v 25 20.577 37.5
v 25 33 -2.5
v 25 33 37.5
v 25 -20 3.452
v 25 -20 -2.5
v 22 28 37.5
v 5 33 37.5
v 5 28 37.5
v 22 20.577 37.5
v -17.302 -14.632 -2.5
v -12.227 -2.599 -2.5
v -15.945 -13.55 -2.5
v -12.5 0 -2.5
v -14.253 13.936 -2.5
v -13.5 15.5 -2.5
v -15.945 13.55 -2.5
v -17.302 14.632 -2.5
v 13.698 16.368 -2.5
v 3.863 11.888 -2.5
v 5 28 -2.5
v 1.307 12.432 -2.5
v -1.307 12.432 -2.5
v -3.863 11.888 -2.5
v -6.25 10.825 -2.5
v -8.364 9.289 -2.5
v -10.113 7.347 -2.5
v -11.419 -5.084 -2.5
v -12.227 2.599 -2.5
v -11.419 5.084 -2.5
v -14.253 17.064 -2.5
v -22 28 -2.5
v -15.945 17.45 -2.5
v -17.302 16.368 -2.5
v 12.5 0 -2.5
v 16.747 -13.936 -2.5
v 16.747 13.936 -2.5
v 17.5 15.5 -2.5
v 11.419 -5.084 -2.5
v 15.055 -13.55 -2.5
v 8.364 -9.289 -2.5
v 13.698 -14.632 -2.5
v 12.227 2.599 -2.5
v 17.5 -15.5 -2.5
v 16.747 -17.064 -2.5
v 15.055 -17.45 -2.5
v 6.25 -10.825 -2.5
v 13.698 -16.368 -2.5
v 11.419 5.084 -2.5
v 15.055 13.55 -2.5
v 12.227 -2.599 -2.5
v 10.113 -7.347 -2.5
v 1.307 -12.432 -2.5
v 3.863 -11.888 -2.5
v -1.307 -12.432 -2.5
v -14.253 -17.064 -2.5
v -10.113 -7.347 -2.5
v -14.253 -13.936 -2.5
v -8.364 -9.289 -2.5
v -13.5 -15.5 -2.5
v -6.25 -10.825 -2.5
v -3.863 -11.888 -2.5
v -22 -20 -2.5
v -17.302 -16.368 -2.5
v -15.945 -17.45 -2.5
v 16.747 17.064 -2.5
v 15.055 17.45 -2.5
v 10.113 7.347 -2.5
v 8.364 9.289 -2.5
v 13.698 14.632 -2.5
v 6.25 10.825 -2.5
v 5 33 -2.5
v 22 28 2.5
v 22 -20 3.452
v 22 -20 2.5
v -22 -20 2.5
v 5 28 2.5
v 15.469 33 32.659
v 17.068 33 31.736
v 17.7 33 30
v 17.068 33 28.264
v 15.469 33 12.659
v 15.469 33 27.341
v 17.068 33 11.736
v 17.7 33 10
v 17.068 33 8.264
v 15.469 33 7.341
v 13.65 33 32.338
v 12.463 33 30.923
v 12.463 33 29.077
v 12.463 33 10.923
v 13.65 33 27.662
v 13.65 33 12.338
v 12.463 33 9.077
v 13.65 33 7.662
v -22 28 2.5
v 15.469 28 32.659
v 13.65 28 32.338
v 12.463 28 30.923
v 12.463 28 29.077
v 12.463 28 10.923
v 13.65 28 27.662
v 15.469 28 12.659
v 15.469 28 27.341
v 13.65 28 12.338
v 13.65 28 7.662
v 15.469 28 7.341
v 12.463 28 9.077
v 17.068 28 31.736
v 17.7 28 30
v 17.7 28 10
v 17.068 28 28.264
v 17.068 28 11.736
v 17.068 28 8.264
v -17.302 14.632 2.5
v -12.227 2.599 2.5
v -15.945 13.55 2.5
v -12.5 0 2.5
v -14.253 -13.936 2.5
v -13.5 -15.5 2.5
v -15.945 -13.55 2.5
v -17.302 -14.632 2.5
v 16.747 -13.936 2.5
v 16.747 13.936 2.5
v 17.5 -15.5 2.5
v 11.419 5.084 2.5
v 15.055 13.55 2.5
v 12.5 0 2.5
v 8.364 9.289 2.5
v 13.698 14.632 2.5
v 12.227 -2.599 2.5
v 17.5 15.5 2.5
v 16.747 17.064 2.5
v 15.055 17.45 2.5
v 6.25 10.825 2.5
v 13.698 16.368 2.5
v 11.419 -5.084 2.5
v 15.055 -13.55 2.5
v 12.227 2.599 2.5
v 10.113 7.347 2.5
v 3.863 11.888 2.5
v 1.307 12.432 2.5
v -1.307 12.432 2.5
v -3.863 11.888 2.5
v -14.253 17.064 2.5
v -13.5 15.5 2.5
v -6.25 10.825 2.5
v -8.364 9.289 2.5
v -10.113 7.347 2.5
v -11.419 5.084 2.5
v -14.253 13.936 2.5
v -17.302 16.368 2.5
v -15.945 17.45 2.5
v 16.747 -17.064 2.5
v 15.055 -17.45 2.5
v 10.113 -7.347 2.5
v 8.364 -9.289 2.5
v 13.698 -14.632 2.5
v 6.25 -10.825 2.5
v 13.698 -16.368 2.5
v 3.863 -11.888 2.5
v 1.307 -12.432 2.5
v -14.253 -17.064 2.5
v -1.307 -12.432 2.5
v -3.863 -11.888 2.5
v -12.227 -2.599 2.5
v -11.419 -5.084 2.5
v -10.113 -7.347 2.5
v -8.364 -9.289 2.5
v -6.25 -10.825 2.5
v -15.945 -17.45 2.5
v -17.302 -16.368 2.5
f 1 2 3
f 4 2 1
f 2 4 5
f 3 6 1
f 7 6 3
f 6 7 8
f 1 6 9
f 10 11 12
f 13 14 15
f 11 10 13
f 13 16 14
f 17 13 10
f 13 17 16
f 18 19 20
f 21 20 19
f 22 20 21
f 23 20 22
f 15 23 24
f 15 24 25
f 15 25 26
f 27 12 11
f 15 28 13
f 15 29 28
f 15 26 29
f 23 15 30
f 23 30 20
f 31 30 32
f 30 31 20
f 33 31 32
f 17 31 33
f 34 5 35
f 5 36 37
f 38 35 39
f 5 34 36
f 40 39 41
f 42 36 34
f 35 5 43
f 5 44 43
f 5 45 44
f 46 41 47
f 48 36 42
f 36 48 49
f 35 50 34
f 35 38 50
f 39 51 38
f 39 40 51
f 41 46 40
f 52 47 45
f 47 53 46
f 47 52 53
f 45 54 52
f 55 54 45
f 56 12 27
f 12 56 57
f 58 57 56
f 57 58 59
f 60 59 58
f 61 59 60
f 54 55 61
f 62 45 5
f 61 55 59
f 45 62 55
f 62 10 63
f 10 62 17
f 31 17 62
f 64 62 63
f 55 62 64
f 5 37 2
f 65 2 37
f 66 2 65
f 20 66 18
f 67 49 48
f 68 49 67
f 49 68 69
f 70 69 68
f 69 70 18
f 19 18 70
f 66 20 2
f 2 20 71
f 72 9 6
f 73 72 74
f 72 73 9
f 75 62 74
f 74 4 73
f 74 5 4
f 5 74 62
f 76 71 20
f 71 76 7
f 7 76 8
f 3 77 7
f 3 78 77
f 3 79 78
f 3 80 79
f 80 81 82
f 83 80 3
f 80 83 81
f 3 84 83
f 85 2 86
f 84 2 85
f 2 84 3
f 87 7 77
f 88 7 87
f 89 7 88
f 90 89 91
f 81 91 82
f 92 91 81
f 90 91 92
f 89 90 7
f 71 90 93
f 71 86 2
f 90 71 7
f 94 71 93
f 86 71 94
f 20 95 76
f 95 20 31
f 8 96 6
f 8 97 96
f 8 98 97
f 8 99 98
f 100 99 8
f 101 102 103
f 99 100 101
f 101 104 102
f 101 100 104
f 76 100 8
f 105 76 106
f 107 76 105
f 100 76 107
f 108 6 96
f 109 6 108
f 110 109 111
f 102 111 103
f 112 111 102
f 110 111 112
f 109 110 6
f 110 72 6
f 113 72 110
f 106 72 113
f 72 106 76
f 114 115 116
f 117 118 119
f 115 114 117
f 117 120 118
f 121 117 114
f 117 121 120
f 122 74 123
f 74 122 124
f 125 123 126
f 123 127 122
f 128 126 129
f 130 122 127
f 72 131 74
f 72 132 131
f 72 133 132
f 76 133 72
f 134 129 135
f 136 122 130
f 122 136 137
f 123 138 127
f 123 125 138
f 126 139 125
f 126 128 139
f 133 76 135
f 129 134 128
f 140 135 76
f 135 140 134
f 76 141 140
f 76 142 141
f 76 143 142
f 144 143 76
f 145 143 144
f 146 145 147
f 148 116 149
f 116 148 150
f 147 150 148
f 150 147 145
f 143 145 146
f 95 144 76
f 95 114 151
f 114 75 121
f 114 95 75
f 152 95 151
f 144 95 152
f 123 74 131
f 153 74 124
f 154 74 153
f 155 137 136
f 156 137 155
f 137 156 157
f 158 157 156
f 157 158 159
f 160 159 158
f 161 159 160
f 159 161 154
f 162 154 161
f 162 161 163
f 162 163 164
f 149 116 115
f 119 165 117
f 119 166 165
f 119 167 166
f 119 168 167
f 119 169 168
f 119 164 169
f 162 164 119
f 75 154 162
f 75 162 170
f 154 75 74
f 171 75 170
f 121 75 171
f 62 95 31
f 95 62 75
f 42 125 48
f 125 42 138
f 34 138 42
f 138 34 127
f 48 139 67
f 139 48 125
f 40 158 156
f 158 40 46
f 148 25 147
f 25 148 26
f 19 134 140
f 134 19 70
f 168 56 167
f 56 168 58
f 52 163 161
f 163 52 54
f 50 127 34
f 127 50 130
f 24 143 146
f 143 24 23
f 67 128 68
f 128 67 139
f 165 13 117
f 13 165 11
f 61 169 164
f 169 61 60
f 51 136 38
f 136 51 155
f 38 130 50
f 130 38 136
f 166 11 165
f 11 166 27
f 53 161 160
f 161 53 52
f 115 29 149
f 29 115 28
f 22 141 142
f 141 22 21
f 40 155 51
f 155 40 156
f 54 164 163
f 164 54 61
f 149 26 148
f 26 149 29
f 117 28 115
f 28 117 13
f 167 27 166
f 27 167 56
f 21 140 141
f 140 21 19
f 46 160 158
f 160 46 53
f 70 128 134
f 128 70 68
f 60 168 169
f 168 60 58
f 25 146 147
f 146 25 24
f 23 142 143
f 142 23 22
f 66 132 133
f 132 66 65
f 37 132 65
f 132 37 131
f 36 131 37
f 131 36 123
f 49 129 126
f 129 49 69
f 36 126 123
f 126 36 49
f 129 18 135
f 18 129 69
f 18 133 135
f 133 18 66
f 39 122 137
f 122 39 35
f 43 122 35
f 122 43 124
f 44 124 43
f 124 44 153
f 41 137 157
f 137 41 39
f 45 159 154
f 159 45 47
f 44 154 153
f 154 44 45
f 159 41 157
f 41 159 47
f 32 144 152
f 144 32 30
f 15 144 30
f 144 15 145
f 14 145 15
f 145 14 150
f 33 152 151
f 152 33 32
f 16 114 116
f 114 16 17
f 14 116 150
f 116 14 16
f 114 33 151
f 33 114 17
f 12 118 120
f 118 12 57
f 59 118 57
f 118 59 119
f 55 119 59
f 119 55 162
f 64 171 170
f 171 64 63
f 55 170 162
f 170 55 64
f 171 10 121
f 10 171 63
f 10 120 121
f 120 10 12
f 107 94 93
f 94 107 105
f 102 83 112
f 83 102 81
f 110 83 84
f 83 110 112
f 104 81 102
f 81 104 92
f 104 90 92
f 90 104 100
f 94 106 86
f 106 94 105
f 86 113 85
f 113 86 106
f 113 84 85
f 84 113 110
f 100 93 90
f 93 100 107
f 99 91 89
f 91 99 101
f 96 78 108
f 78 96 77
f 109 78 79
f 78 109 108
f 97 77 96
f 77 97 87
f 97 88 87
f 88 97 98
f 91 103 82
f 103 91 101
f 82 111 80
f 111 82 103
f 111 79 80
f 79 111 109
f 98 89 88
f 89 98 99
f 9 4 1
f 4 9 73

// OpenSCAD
// file: Rook_Config.scad
// Rook 3D Printer Configuration
// Created By Jeffrey Olijar 
// Jolijar@gmail.com

// Layer Height
LH = 0.38;

// 608 skate bearing
Bearing_OD = 22.5; 
Bearing_ID = 8;
Bearing_H = 7;

// M3 Nut Diameter
N3 = 7.5;

// M4 Screw Hole Diameter
M4 = 4;

// M5 Screw Hole Diameter
M5 = 5.4;

// M8 Rod Diameter (configure for a tight fit)
M8 = 8.2;

// M8 Nut Diameter
N8 = 15.5;

//LM8UU Bearing
LBD = 15.4; // Diameter
LBH = 25; // Height
LBI = 8;  // Inner Diameter

//Makergear Groovemount
GVO = 16.5; // Outside Diameter
GVI = 12.5;  // Inside Groove Diameter

// Distance Between Centers for X rods
DBCX = 70;
// main file
// Rook 3D Printer 
// Y Motor Holder
// Created By Jeffrey Olijar 
// Jolijar@gmail.com
// Revision 1.00
// 1 x required 

include <Rook_Config.scad> 


module Rook_Y_Motor(){

difference(){ 
	union(){
	//Support Structure
		translate(v=[23.5,4.5,17.5]){ 
			cube(size = [3,49,40], center = true);
		}
	// Rail Mount
		translate(v=[15,30.5,17.5]){ 
			cube(size = [20,5,40], center = true);
		}
	// Stepper Motor Mount
		translate(v=[0,4,0]){ 
			cube(size = [44,48,5], center = true);
		}
	}
	union(){
	// Stepper Motor Holes
		rotate(a=[0,0,0])translate(v=[0,0,-10]){ 
			cylinder(h=43,r=12.5, center = true);
			translate(v=[15.5,15.5,0]){ 
				cylinder(h=20,r= M4/2);
				}
			translate(v=[15.5,-15.5,0]){
				cylinder(h=20,r=M4/2);
				}
			translate(v=[-15.5,15.5,0]){
				cylinder(h=20,r=M4/2);
				}
			translate(v=[-15.5,-15.5,0]){
				cylinder(h=20,r=M4/2);
				}
			}
		}
	// Rail Mount Holes
		rotate(a=[90,0,0])translate(v=[15,3,-40]){ 
			translate(v=[0,7,0]){ 
				cylinder(h=100,r= M5/2);
				}
			translate(v=[0,27,0]){ 
				cylinder(h=100,r= M5/2);
				}
			}
	// Support Cutaway
		rotate(a=[40,0,0])translate(v=[23.5,14,40.5]){ 
			cube(size = [3,74,50], center = true);
			}
		}
	}

Rook_Y_Motor();
